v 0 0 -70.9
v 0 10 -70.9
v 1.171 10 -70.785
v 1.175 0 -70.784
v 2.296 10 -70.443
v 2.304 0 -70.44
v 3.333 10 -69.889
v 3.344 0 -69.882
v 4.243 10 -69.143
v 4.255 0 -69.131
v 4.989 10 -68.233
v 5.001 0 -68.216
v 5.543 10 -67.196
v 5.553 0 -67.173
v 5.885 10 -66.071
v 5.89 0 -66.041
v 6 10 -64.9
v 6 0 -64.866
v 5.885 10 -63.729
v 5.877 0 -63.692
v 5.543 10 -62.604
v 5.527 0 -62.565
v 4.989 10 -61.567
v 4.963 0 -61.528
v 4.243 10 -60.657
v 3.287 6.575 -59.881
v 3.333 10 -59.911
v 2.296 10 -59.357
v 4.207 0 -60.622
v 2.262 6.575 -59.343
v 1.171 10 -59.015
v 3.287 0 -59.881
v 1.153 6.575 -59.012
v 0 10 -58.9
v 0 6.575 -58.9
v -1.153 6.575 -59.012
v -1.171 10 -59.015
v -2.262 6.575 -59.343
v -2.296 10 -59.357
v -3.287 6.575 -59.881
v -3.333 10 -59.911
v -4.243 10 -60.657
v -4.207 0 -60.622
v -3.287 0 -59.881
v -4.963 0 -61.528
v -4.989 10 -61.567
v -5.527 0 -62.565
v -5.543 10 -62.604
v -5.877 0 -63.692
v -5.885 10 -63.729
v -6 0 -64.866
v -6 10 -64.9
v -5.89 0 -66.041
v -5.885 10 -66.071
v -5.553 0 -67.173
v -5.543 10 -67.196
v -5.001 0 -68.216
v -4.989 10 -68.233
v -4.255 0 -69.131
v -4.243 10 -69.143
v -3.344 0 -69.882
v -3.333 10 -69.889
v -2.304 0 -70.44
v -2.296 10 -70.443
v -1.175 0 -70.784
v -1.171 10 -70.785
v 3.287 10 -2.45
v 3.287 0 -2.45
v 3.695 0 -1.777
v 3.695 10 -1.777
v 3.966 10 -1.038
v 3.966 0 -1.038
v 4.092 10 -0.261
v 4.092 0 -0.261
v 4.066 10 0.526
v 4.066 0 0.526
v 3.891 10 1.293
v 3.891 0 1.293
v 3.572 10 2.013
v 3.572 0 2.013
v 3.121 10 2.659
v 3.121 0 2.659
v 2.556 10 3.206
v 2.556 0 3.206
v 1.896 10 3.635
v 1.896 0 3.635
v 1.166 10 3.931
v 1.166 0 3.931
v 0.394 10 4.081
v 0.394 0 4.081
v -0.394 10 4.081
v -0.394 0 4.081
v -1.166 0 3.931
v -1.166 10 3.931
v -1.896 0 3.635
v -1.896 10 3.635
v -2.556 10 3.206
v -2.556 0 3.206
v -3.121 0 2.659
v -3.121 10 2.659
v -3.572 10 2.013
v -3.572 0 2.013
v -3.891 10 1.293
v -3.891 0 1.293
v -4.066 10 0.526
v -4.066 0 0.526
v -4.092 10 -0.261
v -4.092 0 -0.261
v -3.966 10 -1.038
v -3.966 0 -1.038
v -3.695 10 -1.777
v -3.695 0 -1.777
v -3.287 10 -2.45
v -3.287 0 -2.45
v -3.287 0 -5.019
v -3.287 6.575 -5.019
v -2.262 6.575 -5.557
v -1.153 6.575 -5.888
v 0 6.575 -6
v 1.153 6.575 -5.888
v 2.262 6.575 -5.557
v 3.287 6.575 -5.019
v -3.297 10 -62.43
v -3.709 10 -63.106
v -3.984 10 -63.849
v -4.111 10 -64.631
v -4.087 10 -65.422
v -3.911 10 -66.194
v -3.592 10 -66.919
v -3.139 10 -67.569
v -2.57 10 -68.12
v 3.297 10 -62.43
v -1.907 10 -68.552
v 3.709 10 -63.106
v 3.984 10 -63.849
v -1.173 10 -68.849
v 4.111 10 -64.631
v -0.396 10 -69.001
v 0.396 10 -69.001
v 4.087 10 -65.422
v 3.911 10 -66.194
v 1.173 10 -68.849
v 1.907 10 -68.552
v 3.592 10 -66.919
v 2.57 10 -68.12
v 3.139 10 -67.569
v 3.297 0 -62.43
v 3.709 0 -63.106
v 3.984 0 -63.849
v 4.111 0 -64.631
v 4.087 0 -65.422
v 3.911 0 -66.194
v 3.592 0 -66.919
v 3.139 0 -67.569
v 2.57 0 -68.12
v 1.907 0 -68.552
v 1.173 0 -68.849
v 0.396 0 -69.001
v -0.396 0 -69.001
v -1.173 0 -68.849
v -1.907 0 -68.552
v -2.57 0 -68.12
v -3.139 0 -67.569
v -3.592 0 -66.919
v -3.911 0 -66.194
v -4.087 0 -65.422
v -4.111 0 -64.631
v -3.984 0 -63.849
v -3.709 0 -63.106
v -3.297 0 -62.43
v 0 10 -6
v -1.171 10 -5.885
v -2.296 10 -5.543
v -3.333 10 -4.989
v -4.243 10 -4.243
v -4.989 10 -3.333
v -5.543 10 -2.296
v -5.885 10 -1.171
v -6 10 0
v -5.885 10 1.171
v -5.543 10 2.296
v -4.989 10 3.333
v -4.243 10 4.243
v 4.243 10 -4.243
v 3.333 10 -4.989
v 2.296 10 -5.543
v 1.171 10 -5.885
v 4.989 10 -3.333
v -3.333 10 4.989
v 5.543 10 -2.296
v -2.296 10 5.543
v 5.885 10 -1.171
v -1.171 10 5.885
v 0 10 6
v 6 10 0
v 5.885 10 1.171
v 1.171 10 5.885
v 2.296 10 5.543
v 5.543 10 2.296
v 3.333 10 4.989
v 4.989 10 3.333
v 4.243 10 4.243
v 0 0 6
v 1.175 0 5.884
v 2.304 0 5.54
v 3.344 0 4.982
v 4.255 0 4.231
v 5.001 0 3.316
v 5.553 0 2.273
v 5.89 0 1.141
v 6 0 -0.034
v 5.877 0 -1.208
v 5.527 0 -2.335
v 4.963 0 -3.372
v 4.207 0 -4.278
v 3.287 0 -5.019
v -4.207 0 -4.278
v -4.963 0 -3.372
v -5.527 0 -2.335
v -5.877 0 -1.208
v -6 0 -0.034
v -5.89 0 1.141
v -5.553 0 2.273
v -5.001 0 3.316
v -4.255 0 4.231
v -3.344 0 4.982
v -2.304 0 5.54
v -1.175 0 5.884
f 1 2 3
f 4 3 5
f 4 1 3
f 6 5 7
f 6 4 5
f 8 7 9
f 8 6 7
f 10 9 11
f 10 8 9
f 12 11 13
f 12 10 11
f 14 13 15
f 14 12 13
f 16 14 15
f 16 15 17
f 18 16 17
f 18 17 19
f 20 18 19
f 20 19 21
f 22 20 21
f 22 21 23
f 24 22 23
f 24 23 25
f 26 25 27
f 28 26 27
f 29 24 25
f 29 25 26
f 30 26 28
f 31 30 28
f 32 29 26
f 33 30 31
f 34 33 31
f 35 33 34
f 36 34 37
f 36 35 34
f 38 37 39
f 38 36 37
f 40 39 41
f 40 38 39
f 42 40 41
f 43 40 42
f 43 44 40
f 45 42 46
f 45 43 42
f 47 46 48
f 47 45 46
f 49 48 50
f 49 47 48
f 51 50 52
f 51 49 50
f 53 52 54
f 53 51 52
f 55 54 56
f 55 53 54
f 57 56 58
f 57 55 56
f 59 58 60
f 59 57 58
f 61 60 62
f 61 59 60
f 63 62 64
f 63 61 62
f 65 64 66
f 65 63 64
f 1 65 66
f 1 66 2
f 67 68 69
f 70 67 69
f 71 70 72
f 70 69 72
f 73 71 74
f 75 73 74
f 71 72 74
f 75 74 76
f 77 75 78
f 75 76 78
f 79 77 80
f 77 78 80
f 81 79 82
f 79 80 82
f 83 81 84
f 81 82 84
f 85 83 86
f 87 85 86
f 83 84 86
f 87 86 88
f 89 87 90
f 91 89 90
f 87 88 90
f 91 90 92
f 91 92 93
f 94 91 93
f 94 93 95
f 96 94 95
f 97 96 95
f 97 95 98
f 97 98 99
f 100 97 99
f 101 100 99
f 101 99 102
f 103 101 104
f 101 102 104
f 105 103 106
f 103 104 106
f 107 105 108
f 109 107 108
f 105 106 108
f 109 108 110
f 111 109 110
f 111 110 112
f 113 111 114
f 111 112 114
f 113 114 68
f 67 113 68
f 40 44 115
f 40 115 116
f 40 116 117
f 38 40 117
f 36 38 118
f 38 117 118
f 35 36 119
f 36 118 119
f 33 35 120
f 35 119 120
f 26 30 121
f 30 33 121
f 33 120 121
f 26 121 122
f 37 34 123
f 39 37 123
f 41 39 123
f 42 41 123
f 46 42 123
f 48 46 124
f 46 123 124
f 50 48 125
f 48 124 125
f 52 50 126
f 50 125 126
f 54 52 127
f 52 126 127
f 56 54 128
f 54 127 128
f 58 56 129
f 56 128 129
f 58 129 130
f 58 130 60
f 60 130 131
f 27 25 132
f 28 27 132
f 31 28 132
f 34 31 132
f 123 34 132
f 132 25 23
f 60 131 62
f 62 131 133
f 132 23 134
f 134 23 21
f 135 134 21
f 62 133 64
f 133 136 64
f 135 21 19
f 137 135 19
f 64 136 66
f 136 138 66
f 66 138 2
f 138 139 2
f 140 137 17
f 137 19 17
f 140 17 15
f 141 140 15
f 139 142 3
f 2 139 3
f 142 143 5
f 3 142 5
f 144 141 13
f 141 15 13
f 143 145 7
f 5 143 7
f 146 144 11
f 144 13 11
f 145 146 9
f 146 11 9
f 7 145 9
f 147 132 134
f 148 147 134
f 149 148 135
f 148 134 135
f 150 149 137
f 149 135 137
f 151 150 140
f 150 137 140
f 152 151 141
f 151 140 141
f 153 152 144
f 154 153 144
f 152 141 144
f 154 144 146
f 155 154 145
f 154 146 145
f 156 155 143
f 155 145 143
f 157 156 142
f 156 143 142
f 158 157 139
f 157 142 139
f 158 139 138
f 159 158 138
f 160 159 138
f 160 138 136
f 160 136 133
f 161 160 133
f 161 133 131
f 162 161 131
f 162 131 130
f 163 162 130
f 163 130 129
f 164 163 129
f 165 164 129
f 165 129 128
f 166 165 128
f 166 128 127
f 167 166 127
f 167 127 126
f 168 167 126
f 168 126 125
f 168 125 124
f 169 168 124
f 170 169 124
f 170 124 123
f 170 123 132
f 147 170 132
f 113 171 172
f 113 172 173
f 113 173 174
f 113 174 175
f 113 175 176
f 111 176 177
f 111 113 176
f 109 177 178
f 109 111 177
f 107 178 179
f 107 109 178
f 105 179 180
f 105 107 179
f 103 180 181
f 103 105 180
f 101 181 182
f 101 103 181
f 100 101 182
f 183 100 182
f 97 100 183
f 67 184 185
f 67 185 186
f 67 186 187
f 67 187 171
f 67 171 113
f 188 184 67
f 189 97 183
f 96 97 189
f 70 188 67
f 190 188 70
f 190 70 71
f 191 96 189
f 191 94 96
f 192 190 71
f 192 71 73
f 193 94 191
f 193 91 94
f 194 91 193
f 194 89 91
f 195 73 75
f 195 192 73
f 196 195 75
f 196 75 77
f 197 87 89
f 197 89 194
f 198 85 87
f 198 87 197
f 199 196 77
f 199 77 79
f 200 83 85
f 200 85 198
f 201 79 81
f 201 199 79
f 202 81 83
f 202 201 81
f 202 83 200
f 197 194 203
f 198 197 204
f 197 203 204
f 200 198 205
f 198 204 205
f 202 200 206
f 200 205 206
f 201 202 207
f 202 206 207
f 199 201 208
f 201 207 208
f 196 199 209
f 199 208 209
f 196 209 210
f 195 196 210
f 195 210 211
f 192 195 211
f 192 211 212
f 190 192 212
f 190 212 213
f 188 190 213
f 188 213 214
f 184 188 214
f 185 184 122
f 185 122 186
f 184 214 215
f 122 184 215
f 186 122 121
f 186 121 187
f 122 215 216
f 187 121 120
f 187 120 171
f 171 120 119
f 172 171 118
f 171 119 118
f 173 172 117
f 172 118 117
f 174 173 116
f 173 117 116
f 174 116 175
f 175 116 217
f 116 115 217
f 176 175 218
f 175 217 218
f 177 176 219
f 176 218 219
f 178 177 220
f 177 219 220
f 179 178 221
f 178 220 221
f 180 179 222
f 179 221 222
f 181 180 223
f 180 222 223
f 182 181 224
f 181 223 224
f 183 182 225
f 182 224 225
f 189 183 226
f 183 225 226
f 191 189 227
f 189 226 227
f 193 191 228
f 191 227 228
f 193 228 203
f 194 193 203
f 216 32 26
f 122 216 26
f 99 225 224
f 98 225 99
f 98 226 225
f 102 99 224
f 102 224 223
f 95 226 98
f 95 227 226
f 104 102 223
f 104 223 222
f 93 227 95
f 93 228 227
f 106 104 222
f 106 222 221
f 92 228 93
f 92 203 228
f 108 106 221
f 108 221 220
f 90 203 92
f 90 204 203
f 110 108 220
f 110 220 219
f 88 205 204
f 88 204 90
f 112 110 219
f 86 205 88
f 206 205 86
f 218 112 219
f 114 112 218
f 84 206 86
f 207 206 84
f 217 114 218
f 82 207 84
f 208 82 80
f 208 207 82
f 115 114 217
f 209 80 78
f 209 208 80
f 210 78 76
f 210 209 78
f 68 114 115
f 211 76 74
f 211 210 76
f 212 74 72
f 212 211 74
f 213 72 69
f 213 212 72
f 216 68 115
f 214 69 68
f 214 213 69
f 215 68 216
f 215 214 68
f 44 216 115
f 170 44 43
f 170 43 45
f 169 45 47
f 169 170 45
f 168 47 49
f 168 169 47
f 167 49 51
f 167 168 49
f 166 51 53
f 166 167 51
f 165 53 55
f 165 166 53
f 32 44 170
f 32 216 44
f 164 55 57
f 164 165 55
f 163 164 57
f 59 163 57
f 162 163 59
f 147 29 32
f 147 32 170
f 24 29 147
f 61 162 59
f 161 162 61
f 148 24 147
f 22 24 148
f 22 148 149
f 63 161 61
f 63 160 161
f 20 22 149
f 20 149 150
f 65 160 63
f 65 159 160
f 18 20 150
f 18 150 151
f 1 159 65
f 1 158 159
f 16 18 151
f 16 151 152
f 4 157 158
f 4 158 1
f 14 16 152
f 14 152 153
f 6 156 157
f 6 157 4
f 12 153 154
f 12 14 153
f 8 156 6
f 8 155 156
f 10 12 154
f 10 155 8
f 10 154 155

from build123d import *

# Parameters (mm, degrees)
SKETCH1_R           = 6
BOSS_EXTRUDE1_DEPTH = 10
SKETCH2_W           = 6.574952472
SKETCH2_H           = 6.574952471
BOSS_EXTRUDE2_DEPTH = 60
CUT_EXTRUDE1_DEPTH  = 72.85269654


with BuildPart() as part:
    # Sketch1 → Boss-Extrude1 (new body)
    with BuildSketch(Plane(origin=(0, 0, 0), x_dir=(1, 0, 0), z_dir=(0, 1, 0))):
        with Locations(Location((0, 0, 0), (0, 0, 270))):
            Circle(SKETCH1_R)
        with BuildLine():
            Line((-3.287476236, 2.45), (3.287476236, 2.45))
            ThreePointArc((3.287476236, 2.45), (0, -4.1), (-3.287476236, 2.45))
        make_face(mode=Mode.SUBTRACT)
    boss_extrude1 = extrude(amount=BOSS_EXTRUDE1_DEPTH)

    # Sketch2 → Boss-Extrude2 (add)
    with BuildSketch(Plane.XY.offset(-2.45)):
        with Locations((0, 3.287476236)):
            Rectangle(SKETCH2_W, SKETCH2_H)
    extrude(amount=-BOSS_EXTRUDE2_DEPTH)

    # Mirror1: Boss-Extrude1 across plane
    add(boss_extrude1.mirror(Plane(origin=(0, 0, -32.45), x_dir=(1, 0, 0), z_dir=(0, 0, -1))))

    # Sketch3 → Cut-Extrude1 (cut, through all)
    with BuildSketch(Plane(origin=(0, 10, 0), x_dir=(1, 0, 0), z_dir=(0, 1, 0))):
        with BuildLine():
            Line((-3.297499052, 62.43), (3.297499052, 62.43))
            ThreePointArc((3.297499052, 62.43), (0, 69.02), (-3.297499052, 62.43))
        make_face()
    extrude(amount=-CUT_EXTRUDE1_DEPTH, mode=Mode.SUBTRACT)


solid = part.part
